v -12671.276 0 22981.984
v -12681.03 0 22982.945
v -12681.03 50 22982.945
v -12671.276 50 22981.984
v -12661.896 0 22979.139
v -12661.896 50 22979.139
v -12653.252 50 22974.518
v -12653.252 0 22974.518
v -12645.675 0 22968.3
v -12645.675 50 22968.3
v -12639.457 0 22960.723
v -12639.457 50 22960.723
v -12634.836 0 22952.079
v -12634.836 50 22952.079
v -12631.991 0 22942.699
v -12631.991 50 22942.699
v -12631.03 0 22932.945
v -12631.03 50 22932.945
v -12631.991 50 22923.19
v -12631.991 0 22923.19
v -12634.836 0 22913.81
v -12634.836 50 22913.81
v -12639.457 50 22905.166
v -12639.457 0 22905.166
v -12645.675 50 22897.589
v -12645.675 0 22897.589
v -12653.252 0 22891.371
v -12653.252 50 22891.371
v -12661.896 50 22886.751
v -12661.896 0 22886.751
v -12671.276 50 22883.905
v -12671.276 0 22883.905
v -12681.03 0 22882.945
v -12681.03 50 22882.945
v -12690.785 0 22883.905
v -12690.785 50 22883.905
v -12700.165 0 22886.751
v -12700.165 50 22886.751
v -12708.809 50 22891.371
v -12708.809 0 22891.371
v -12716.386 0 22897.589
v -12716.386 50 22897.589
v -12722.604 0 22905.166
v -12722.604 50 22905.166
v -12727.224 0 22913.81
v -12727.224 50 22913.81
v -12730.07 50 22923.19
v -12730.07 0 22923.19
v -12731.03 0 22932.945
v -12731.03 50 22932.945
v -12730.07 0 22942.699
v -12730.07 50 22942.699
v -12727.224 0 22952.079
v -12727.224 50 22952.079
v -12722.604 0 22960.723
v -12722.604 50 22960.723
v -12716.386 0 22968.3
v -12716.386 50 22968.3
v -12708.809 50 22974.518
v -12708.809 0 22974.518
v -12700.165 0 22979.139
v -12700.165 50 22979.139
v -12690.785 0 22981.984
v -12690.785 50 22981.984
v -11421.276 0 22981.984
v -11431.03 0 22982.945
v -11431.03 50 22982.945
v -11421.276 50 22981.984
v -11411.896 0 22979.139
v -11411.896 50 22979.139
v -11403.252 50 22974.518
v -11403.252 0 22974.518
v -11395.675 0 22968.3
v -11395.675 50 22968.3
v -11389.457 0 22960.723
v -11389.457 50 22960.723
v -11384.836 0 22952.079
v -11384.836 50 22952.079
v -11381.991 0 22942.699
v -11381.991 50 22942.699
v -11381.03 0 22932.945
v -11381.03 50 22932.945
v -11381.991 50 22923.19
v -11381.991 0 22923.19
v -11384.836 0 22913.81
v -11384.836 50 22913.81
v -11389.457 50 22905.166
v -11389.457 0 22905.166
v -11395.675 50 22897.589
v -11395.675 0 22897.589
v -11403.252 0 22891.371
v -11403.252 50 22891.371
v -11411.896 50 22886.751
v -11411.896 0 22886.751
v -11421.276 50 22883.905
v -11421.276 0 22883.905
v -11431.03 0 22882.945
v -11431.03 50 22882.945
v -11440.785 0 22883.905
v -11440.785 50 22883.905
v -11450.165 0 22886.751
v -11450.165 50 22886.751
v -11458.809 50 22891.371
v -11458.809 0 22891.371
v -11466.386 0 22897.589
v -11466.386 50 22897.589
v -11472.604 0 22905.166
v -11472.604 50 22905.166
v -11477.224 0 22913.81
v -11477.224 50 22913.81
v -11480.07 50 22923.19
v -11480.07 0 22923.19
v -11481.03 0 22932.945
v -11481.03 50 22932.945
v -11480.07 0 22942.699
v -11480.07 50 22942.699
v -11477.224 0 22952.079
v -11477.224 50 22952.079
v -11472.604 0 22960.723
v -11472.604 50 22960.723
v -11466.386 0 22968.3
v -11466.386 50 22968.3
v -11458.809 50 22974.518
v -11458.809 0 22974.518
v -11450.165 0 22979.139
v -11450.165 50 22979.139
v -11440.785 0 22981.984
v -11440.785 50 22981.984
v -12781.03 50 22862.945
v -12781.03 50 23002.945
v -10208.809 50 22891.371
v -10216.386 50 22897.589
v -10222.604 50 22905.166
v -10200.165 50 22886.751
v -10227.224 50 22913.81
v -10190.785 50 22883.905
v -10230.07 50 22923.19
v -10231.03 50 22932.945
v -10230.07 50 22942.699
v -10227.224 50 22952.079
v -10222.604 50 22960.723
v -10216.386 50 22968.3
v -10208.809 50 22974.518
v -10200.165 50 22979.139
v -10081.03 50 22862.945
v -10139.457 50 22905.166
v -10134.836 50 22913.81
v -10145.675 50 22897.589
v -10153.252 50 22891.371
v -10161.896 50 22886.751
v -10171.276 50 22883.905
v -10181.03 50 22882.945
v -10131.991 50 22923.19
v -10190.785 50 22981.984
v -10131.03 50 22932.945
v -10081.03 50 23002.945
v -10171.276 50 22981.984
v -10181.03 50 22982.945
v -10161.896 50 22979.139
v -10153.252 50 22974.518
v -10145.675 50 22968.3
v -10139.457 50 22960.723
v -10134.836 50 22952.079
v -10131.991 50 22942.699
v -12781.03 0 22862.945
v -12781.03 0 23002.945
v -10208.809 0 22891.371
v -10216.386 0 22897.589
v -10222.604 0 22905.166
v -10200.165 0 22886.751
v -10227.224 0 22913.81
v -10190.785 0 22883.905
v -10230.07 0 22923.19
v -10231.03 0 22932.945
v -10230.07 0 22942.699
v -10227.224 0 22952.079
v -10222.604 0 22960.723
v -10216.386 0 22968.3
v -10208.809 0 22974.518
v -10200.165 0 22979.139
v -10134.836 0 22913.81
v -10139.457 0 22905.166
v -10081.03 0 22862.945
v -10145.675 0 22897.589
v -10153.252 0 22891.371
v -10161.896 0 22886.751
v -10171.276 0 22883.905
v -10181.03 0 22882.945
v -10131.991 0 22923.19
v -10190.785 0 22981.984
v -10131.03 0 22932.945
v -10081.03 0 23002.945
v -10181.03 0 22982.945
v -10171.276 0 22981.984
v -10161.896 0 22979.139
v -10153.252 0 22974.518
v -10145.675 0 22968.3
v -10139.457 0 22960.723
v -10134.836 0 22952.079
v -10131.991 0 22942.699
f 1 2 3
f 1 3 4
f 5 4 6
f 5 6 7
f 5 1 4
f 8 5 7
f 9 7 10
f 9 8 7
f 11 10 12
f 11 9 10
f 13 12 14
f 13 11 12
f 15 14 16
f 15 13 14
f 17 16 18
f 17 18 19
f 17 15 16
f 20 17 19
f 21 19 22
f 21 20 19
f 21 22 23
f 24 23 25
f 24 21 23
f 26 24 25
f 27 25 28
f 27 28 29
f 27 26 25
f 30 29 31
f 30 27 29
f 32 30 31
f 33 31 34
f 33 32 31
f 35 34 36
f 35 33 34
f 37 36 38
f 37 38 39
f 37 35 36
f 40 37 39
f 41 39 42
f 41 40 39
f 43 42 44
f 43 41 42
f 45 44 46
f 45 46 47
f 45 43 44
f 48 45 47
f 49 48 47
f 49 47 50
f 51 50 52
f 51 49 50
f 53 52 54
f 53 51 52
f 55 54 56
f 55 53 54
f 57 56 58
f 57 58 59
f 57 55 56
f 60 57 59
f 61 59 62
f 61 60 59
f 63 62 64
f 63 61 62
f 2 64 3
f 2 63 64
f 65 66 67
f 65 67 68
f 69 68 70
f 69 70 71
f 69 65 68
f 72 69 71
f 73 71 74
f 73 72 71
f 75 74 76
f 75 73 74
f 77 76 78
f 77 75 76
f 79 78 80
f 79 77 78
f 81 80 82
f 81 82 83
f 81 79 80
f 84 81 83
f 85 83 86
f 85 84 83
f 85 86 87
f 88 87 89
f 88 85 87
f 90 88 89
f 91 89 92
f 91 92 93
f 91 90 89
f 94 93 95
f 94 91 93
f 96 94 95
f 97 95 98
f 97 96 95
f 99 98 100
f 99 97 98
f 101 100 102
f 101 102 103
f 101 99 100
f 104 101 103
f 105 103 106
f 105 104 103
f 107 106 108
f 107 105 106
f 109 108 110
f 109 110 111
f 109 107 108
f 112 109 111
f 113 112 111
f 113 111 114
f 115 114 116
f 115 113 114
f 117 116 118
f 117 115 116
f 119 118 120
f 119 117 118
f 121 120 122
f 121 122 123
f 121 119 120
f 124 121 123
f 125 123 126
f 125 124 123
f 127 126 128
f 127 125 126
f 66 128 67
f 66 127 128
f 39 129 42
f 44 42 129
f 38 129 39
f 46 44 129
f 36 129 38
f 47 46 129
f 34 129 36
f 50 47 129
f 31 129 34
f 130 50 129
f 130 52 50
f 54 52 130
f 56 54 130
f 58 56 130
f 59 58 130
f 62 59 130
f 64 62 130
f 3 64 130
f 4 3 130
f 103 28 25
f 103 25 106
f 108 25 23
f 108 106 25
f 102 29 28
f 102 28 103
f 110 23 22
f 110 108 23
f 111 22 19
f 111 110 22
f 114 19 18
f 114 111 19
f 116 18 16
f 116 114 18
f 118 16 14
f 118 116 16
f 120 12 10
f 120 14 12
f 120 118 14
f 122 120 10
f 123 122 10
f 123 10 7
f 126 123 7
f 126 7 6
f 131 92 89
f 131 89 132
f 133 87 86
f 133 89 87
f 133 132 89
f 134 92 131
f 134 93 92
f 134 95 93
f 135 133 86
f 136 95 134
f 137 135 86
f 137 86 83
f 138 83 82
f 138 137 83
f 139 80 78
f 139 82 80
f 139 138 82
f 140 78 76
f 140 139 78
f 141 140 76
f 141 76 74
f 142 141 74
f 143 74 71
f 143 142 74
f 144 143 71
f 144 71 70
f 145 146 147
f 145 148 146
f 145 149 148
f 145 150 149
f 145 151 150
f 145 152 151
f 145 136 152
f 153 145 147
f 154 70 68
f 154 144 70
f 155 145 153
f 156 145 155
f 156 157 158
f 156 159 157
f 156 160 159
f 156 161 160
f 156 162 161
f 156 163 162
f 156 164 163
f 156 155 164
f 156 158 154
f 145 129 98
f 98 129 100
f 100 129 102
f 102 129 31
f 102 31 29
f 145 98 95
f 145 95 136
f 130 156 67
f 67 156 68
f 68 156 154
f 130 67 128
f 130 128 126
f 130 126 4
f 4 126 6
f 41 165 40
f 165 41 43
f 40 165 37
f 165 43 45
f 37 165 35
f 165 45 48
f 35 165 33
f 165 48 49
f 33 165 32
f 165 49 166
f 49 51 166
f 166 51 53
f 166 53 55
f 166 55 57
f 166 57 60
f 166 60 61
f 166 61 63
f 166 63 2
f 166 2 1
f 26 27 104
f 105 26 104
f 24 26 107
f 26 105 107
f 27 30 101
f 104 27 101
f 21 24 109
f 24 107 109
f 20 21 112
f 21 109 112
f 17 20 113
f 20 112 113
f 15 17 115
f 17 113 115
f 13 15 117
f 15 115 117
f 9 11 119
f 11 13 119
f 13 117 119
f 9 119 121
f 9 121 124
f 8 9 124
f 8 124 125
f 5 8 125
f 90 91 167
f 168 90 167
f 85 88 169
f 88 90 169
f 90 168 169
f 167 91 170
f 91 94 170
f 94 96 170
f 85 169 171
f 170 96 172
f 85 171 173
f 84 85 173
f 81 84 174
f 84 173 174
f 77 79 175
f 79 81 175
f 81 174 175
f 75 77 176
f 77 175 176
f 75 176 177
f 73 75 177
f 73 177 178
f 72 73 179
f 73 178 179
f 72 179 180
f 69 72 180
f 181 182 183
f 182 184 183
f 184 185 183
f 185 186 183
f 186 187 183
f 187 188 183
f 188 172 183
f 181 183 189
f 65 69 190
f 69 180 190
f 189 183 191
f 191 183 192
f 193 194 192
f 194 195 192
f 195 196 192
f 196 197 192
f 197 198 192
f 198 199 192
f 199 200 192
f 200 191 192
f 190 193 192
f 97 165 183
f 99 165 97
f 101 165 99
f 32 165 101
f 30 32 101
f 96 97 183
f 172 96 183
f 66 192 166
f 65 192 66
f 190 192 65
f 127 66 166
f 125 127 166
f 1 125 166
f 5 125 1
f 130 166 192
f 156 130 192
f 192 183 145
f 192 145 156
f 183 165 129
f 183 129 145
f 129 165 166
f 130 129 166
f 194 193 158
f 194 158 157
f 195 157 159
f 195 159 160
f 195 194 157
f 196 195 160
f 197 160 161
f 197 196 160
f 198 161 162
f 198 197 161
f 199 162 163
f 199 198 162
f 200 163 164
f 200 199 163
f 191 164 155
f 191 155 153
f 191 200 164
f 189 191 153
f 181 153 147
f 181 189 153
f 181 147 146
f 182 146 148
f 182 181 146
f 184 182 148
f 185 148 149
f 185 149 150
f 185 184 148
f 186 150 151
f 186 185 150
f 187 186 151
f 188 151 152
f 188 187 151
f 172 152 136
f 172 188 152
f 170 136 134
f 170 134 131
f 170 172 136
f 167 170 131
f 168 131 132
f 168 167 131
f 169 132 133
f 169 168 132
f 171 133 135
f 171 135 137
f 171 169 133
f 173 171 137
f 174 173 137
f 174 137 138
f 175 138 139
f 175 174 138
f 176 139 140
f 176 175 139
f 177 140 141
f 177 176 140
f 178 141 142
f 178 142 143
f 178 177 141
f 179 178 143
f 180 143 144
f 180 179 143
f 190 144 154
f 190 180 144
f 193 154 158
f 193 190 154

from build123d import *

# Parameters (mm, degrees)
SKETCH2_W           = 140
SKETCH2_H           = 2700
SKETCH2_R           = 50
BOSS_EXTRUDE1_DEPTH = 50


with BuildPart() as part:
    # Sketch2 → Boss-Extrude1 (new body)
    with BuildSketch(Plane.ZX):
        with Locations((22932.944645813, -11431.030459334)):
            Rectangle(SKETCH2_W, SKETCH2_H)
        with Locations((22932.944645813, -12681.030459334)):
            Circle(SKETCH2_R, mode=Mode.SUBTRACT)
        with Locations((22932.944645813, -11431.030459334)):
            Circle(SKETCH2_R, mode=Mode.SUBTRACT)
        with Locations((22932.944645813, -10181.030459334)):
            Circle(SKETCH2_R, mode=Mode.SUBTRACT)
    extrude(amount=BOSS_EXTRUDE1_DEPTH)


solid = part.part
